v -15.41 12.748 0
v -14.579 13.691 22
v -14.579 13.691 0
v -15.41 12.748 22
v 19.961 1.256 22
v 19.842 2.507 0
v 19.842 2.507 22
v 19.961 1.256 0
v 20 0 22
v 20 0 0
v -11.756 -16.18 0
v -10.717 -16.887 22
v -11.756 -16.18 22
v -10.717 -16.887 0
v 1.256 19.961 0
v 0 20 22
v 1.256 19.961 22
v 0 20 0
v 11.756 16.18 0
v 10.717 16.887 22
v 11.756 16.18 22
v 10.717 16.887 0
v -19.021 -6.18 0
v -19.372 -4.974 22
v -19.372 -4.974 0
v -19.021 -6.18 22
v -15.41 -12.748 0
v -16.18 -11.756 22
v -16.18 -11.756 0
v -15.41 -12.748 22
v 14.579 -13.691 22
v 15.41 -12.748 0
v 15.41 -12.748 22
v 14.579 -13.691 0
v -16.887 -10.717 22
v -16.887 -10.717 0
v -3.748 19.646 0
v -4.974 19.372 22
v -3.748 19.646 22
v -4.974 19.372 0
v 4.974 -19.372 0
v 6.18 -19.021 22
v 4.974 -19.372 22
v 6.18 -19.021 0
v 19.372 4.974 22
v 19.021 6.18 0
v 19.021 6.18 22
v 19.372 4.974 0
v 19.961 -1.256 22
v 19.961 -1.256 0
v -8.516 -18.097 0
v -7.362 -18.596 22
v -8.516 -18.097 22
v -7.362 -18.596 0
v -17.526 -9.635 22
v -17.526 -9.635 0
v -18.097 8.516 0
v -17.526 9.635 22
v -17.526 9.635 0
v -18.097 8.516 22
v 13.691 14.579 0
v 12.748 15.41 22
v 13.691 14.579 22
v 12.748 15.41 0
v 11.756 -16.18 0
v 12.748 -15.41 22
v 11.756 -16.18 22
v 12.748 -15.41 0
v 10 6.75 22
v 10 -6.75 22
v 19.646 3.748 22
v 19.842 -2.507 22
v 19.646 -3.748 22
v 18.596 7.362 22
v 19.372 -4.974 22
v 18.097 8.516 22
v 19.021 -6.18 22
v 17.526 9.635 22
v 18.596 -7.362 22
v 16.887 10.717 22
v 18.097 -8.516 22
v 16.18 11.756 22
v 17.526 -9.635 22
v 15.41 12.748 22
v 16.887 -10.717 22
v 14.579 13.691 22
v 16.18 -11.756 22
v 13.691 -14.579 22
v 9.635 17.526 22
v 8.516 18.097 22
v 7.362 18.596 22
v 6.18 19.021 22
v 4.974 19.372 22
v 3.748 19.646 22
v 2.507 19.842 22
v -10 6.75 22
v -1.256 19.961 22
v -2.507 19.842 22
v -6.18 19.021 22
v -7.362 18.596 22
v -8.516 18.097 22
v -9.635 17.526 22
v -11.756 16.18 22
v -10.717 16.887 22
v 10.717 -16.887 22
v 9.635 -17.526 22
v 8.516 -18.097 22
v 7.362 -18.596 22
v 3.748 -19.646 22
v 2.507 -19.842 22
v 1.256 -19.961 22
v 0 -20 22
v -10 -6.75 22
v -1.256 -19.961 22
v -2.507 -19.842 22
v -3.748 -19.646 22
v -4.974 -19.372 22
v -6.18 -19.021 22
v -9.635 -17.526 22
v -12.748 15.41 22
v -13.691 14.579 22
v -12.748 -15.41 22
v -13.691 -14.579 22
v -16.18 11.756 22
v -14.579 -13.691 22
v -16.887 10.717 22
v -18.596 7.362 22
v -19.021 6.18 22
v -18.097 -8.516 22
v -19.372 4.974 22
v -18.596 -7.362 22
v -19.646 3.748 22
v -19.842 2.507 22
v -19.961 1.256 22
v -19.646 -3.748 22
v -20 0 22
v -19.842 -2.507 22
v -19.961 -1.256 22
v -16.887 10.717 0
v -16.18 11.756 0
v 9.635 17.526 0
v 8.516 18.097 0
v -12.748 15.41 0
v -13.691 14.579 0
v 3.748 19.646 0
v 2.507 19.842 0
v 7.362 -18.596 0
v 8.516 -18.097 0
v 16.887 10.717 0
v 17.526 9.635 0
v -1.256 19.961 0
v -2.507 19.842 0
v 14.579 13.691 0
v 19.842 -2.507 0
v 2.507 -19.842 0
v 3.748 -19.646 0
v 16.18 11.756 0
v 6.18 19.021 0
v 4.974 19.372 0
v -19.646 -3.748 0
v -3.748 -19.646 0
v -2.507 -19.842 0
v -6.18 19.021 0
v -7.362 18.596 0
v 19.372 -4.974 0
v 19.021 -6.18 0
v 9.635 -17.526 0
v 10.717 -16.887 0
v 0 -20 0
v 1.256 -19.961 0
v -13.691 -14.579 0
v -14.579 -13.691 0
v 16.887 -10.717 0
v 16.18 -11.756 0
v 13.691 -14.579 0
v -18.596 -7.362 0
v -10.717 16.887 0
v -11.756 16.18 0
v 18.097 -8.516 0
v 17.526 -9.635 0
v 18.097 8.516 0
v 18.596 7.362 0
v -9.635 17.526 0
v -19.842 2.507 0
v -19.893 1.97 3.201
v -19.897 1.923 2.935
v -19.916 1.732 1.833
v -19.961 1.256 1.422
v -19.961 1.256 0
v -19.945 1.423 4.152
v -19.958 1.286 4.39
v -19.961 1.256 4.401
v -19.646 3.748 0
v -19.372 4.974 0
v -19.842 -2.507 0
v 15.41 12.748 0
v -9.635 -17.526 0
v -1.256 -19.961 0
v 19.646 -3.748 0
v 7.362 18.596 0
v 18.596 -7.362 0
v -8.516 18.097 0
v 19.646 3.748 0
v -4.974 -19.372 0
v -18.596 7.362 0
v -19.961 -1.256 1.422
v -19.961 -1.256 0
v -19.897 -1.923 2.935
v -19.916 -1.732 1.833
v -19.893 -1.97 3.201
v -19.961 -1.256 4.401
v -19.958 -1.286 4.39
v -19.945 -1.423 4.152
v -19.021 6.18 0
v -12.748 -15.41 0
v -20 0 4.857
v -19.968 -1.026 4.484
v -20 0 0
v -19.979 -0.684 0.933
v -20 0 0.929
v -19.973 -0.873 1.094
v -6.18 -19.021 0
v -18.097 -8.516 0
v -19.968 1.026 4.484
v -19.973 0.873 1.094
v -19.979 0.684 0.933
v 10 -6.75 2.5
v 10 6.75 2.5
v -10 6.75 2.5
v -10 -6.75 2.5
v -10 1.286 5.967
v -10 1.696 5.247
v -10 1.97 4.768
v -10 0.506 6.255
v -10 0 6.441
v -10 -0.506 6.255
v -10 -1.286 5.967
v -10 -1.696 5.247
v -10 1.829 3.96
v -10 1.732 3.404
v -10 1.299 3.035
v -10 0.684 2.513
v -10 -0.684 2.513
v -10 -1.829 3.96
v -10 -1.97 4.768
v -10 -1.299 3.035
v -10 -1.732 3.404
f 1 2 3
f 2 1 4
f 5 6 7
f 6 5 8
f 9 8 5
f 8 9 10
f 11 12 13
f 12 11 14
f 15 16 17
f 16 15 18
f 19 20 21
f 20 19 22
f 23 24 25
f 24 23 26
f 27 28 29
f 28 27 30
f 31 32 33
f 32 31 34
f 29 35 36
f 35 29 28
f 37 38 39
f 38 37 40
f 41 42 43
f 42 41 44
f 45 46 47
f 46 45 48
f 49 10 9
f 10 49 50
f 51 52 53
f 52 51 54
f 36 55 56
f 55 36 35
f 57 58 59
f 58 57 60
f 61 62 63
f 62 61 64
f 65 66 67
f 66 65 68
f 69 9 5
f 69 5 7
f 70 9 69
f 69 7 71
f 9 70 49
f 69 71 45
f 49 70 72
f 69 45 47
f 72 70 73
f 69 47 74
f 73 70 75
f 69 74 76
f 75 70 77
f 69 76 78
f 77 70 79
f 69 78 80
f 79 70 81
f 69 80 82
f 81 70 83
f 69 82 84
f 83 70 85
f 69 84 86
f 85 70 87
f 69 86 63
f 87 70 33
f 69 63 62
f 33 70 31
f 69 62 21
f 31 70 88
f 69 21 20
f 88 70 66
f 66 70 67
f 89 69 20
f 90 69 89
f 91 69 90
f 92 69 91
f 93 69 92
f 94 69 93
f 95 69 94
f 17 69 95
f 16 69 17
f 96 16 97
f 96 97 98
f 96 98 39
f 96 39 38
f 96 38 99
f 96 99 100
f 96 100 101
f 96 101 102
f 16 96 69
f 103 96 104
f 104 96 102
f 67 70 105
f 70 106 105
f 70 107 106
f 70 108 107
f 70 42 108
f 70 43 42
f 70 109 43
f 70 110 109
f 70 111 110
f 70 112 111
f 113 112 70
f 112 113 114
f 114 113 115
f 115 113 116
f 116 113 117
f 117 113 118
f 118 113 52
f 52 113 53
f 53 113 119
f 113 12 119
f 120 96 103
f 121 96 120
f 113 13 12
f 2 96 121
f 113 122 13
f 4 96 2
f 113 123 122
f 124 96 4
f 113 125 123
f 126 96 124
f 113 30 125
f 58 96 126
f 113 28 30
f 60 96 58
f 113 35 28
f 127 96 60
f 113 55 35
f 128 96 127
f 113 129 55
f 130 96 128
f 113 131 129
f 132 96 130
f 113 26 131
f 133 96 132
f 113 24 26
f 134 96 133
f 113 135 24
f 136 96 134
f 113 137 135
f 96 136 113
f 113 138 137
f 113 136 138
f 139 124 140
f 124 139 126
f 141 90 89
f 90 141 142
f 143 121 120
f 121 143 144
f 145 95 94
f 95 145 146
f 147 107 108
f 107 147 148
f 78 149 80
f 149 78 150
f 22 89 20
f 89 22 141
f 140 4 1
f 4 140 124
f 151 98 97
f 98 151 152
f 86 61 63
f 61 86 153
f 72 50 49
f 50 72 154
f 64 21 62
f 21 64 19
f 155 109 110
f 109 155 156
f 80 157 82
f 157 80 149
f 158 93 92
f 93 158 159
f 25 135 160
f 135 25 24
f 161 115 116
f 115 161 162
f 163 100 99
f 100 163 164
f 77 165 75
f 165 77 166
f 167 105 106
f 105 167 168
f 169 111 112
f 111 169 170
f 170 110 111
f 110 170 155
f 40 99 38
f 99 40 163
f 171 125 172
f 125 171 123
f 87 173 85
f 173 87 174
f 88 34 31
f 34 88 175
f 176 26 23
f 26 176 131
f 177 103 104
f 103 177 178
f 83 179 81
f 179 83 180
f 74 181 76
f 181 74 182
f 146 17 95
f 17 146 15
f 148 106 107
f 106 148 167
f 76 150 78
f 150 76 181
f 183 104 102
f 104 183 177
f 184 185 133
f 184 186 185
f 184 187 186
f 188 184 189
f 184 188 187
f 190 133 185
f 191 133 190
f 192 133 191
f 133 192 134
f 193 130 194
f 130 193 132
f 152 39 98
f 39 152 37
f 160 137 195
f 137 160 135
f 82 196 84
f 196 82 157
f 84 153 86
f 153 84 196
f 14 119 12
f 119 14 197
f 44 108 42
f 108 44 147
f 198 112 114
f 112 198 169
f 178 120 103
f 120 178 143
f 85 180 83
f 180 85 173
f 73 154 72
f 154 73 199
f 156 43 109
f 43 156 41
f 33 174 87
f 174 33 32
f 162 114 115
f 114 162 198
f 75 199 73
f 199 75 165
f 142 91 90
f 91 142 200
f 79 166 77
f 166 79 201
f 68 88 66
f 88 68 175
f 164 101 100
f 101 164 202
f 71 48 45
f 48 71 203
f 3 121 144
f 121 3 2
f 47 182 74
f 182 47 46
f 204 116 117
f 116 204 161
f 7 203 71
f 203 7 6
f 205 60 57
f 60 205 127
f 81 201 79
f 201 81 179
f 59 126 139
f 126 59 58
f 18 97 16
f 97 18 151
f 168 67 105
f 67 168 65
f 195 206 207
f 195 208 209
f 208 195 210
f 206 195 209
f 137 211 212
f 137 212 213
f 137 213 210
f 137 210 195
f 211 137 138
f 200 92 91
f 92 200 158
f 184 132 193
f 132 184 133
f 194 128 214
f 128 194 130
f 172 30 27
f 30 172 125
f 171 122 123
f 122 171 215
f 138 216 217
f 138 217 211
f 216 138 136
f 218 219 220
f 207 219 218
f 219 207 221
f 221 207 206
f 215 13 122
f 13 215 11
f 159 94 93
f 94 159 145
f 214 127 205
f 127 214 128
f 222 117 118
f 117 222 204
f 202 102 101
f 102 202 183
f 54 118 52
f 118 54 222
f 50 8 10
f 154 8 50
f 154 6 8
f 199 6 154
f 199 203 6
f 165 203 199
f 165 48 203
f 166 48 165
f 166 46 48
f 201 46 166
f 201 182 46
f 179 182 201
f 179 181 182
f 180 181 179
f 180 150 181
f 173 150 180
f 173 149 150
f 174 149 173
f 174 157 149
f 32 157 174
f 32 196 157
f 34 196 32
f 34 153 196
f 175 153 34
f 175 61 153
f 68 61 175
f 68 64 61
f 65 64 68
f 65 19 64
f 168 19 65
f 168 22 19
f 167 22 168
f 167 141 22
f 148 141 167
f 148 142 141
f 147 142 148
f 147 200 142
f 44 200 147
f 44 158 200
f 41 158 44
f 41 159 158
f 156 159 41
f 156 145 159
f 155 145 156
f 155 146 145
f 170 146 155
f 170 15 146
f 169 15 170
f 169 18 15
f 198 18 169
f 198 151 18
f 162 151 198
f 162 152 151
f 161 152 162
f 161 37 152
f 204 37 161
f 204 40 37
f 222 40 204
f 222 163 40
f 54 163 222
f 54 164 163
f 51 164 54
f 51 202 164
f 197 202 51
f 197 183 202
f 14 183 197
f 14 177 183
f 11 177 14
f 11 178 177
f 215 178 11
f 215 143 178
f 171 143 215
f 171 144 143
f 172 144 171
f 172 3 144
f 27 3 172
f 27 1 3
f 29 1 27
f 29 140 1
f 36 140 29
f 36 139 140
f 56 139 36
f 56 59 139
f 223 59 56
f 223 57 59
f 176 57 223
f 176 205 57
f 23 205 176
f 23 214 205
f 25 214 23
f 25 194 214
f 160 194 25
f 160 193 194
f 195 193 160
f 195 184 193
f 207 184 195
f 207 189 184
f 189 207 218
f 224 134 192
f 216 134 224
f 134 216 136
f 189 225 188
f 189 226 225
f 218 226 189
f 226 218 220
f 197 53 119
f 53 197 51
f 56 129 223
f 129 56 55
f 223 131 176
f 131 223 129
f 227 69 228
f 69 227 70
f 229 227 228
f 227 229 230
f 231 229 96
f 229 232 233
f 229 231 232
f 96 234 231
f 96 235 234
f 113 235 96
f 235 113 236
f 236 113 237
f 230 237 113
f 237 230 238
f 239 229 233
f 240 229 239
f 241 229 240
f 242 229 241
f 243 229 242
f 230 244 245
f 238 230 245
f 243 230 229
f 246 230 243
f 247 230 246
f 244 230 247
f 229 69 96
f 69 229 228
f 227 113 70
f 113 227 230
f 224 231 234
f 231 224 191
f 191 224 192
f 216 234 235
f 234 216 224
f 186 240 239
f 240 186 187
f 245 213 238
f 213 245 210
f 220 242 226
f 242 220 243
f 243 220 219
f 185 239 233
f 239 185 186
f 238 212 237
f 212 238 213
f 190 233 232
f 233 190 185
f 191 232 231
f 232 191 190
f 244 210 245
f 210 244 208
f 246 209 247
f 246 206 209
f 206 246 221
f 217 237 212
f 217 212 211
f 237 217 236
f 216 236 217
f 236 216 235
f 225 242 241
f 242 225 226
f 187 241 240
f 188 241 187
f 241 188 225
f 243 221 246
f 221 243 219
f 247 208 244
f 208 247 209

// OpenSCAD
wall=2;
$fn=100;

module switch() {
	// upper cube
	translate([0,0,-3.6-2.7-8.5]) {
		// Moving rod
		translate([0,0, 3.6+2.7+8.5])
		cylinder(d=8, h=7.3);

		// Holding washer
		translate([0,0,3.6])
		cylinder(d=16, h=2.7);

		// screw
		translate([0,0,3.6+2.7])
		cylinder(d=11.7, h=8.5);

		cube([24, 16.5, 7.2], center=true);

		// Smaller lower cube
		translate([0,0,-(7.2 + 10)/2])
		cube([20,13,10], center=true);

		// Connector 1a
		translate([7.5,0,-(7.2/2) - 10 - 4])
		cube([1, 5, 8], center=true);

		// Connector 1
		translate([0,0,-(7.2/2) - 10 - 4])
		cube([1, 5, 8], center=true);
	}
}

module basement_bottom() {
	difference() {
		cylinder(d=40, h=20+wall);

		// the switch
		translate([0,0,10+wall+1])
		cube([20, 13.5, 21], center=true);

		// the wire
		translate([0,0,2+2+wall])
		rotate([0,-99,0])
		cylinder(d=4, h=25, $fn=9);
	}
}

module basement_top() {
	// ?????????????????????????????????
}

module switch_top() {
	difference () {
		sphere(d=60, $fn=30);
		translate([0,0,-35])
		cube([70, 70, 70], center=true);

		translate([0,0,-0.1])
		cylinder(d=41, h=14.1+wall);

		translate([0,0,13.99+wall])
		cylinder(d1=41, d2=8, h=8);

		#translate([0,0,13.98+8+wall])
		cylinder(d=8, h=3);
	}
}

difference() {
switch_top();
translate([-50,0,-10])
cube([100, 100, 100]);
}
!basement_bottom();

// translate([0,0,-5]) basement_bottom();


//translate([0,0,33+5+wall]) switch();
